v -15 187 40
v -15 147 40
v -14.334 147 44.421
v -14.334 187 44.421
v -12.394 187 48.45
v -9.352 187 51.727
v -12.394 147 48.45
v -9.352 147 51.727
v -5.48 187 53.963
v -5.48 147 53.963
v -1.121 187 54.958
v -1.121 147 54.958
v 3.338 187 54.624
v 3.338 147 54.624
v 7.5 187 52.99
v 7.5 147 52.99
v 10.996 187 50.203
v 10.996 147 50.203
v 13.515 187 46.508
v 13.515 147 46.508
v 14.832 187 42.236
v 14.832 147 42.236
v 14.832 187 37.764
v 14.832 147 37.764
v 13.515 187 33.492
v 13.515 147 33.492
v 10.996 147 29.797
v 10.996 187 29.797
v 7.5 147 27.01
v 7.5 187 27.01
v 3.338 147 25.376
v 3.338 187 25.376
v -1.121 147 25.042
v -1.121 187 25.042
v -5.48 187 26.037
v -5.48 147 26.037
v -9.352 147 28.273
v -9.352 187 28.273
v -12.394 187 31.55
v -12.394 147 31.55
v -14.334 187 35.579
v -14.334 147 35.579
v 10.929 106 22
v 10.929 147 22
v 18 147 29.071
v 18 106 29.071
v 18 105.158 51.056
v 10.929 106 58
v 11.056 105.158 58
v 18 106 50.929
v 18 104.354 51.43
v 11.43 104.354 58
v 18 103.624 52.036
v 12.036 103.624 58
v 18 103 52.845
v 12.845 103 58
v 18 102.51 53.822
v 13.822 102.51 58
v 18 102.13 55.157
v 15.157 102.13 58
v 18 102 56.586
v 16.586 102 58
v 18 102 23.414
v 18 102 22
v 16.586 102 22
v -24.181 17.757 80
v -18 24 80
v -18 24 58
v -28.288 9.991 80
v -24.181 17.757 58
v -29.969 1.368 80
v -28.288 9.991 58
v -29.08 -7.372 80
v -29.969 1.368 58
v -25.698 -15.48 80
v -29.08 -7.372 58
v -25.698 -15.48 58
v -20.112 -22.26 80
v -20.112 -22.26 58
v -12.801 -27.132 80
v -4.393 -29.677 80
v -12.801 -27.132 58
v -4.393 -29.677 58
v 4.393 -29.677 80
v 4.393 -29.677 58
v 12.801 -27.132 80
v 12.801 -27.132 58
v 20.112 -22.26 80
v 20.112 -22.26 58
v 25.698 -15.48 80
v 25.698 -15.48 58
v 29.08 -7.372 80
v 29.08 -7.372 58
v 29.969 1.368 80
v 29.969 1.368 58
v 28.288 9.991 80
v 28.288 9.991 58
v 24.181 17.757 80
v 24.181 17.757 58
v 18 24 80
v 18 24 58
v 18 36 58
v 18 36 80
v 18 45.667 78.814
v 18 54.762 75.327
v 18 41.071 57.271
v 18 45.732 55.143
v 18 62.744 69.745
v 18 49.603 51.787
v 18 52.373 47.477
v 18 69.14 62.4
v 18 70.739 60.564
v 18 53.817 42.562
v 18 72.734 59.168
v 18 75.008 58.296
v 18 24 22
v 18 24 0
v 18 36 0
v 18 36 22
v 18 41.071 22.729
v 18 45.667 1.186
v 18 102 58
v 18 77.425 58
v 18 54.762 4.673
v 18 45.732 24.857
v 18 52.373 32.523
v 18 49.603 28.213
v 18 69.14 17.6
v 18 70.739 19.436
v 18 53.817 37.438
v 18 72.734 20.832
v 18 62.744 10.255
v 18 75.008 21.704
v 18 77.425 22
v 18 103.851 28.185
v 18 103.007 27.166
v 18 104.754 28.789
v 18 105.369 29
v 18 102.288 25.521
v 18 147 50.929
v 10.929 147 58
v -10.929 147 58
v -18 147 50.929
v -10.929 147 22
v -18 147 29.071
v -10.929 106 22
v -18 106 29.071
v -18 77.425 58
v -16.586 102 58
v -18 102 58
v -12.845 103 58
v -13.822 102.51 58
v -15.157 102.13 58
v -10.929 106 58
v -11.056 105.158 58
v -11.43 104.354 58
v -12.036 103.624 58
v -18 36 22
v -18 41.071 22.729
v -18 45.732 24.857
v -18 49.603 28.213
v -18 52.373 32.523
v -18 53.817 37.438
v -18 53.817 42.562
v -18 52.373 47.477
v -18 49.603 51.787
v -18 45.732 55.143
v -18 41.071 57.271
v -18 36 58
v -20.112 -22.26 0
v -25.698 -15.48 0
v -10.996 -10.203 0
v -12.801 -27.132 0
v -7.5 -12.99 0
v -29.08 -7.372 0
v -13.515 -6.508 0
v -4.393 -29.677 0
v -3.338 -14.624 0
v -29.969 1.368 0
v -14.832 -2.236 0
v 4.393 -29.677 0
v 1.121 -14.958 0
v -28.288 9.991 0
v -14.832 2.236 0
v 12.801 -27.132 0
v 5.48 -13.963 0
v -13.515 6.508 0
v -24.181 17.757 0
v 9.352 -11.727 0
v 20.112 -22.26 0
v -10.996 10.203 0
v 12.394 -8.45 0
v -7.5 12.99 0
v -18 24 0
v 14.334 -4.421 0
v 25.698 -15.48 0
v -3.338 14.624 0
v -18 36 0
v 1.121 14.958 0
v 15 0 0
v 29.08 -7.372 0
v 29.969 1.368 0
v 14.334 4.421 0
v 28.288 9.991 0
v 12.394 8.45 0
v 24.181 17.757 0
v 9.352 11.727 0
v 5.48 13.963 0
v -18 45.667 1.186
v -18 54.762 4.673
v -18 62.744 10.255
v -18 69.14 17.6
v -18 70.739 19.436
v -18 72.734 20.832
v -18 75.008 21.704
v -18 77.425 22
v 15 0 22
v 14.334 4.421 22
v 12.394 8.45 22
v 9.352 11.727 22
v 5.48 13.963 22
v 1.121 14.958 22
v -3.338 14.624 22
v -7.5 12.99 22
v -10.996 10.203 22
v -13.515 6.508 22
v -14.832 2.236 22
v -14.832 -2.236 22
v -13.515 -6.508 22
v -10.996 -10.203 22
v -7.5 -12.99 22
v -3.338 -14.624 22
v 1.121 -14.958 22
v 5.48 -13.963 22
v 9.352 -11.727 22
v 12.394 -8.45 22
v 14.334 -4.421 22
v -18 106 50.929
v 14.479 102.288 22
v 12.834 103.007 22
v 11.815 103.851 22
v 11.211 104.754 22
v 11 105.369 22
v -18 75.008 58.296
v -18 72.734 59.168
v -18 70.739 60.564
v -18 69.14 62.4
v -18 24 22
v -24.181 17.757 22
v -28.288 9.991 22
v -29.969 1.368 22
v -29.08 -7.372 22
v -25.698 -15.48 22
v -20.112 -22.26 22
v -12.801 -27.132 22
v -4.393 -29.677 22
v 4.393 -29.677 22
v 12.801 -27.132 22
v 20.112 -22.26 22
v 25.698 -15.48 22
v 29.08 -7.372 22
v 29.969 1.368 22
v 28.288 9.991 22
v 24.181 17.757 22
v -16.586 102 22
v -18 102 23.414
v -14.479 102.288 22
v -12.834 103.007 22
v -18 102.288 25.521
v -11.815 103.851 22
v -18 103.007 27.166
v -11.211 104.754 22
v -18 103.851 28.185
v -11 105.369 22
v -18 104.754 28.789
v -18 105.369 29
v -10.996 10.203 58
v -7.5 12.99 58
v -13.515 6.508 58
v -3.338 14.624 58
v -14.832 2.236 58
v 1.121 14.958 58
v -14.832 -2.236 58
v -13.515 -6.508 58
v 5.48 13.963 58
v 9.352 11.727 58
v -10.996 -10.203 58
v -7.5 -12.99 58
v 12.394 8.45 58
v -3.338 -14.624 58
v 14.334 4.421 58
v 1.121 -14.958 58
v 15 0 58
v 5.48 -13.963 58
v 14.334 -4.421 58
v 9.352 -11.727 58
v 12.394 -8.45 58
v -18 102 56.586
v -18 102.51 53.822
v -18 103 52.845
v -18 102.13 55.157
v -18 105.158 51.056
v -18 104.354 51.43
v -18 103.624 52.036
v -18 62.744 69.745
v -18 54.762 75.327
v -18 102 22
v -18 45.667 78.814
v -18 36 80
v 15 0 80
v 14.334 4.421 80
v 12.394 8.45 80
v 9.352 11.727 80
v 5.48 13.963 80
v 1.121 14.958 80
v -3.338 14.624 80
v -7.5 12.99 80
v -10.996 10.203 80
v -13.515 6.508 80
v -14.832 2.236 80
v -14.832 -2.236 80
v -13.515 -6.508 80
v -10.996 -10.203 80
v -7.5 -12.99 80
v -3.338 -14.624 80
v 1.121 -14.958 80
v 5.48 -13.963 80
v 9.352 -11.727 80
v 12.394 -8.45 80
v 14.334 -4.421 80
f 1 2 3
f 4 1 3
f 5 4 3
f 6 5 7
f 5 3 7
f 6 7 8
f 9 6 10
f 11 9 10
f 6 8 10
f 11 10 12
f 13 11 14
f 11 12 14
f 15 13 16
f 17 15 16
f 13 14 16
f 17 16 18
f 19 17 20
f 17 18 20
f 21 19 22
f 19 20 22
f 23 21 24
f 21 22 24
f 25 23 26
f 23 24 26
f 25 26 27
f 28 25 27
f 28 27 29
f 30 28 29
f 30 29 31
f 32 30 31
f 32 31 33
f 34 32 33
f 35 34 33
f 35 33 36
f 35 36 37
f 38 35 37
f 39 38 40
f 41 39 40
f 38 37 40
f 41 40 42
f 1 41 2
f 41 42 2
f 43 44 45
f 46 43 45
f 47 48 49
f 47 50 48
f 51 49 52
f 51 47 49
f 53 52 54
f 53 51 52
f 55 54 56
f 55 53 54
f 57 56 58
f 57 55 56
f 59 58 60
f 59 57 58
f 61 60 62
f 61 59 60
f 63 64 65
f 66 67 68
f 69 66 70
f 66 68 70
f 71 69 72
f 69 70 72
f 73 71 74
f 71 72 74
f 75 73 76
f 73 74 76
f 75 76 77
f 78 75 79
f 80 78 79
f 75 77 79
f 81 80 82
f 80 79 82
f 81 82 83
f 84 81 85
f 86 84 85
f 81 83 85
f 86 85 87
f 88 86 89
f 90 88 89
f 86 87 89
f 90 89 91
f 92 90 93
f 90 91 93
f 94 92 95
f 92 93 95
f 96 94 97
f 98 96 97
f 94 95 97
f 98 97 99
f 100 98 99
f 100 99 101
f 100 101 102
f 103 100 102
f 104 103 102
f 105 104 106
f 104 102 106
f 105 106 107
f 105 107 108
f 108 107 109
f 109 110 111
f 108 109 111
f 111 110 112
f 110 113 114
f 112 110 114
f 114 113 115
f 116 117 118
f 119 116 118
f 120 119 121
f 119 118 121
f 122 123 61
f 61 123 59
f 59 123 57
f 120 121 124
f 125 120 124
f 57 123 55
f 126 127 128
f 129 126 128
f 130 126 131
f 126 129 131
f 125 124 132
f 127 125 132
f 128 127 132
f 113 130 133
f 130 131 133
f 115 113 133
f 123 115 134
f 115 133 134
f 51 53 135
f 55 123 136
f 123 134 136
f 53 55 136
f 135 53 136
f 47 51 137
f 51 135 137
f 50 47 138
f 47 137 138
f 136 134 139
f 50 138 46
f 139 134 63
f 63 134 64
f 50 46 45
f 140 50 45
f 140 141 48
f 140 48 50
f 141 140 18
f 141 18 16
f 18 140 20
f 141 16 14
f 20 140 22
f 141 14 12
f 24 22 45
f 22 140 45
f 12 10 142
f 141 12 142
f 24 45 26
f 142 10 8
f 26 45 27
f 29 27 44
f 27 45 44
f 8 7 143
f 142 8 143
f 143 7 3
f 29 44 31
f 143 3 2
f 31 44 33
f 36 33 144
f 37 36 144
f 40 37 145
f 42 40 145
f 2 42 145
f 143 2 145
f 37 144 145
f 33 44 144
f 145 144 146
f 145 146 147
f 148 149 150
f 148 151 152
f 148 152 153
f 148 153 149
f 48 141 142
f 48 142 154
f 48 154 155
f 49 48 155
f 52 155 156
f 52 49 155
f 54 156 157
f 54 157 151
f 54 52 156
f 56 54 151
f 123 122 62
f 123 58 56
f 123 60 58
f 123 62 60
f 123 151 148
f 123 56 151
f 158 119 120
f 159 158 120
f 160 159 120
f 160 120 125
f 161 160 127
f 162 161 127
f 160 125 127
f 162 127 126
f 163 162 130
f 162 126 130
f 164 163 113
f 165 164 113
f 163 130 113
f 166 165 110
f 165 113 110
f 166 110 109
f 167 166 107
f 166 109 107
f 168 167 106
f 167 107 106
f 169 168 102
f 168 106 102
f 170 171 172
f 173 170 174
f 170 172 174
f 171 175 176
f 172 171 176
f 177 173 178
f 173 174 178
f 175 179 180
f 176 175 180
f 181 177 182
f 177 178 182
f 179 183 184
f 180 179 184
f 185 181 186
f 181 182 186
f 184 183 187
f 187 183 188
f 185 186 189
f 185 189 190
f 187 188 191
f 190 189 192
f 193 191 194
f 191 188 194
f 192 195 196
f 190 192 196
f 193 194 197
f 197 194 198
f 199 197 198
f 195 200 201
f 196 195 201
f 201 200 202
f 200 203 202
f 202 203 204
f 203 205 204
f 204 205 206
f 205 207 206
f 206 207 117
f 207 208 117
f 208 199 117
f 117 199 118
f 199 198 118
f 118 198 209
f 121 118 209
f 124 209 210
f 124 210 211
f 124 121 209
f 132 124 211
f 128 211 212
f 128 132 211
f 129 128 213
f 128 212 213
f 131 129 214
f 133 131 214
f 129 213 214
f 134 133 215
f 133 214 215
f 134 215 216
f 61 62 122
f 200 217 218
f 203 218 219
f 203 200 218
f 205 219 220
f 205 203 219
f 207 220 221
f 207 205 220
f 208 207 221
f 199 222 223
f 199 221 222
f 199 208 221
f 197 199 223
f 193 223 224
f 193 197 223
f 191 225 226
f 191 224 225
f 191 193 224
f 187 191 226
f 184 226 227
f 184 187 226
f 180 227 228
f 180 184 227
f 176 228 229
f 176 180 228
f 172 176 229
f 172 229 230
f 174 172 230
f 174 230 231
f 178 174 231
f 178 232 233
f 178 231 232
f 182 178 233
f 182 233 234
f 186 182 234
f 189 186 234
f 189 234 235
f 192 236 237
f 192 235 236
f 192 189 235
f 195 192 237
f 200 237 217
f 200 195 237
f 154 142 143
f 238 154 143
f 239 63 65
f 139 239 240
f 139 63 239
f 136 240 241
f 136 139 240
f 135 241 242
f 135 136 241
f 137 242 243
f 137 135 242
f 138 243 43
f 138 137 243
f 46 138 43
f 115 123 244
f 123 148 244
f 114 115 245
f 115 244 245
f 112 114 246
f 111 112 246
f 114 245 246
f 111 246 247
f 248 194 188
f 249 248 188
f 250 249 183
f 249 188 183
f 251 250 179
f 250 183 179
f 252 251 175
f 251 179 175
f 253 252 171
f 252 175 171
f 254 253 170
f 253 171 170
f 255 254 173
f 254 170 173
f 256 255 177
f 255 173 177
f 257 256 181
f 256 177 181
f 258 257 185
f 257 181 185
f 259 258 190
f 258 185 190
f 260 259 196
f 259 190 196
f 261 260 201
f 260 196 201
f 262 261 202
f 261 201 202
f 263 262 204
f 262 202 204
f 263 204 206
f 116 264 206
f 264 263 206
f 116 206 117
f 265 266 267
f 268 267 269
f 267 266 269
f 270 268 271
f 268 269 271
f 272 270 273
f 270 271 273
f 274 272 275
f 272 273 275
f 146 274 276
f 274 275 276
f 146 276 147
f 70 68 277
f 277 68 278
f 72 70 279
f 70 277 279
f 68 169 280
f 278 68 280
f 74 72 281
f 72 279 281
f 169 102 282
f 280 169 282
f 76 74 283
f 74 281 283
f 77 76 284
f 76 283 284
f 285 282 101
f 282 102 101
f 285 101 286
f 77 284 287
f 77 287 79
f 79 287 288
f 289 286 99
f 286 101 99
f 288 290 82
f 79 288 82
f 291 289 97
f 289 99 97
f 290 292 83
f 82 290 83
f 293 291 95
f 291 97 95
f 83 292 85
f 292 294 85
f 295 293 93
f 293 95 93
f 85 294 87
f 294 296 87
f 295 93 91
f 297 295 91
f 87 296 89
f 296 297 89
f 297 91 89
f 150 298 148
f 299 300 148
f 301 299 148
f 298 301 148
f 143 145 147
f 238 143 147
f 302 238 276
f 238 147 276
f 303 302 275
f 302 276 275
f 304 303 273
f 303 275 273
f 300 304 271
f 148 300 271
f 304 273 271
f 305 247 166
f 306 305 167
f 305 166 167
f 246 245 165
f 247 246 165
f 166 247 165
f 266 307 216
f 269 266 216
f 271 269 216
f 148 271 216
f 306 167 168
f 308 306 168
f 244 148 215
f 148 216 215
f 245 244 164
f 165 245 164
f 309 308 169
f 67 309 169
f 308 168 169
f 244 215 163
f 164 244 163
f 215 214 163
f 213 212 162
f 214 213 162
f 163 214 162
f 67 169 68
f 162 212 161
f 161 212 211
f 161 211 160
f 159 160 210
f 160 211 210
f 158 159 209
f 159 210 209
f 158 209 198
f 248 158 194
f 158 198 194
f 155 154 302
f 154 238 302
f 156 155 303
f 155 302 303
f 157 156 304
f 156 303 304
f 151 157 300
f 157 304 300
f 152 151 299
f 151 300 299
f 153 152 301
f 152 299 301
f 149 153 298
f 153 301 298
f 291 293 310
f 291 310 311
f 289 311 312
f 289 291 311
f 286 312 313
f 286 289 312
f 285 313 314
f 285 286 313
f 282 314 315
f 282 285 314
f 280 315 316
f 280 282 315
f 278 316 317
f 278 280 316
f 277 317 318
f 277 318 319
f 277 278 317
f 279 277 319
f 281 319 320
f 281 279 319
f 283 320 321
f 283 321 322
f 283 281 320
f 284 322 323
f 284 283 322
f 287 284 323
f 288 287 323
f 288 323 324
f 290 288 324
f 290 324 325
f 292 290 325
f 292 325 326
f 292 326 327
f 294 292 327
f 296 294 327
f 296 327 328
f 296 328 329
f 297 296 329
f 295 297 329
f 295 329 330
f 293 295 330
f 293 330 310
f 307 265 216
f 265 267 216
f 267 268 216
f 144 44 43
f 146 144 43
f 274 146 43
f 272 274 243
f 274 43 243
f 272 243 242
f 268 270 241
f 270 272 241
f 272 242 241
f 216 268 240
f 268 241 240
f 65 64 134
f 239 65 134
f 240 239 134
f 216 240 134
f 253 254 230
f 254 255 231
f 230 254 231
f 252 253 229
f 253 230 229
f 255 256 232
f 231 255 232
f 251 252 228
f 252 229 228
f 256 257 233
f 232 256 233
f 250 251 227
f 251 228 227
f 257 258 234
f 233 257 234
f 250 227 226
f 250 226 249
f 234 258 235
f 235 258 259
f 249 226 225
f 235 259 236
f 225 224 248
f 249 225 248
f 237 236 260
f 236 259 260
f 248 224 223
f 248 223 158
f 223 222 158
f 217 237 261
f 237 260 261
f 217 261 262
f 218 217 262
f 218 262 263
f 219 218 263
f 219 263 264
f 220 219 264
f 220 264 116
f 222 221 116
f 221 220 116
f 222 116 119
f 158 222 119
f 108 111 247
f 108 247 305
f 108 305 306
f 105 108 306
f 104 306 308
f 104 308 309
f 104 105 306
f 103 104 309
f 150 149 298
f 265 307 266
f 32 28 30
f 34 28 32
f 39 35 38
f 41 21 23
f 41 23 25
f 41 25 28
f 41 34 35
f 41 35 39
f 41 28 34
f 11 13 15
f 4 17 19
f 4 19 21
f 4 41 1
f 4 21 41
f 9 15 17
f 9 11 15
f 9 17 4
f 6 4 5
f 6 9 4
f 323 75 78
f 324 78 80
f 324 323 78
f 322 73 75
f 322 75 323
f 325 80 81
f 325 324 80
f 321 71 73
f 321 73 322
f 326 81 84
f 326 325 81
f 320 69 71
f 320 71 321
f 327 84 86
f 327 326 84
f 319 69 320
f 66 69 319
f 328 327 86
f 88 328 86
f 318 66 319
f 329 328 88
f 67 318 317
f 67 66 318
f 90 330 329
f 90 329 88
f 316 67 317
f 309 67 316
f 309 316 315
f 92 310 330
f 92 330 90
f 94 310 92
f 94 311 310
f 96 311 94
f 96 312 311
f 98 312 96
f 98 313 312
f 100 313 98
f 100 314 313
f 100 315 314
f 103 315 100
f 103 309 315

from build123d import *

# Parameters (mm, degrees)
SKETCH_R        = 15
PAD_DEPTH       = 80
POCKET_DEPTH    = 63.001
FILLET_R        = 10
POCKET001_DEPTH = 45
FILLET001_R     = 4
SKETCH003_R     = 15
PAD001_DEPTH    = 40


with BuildPart() as part:
    # Sketch → Pad (new body)
    with BuildSketch(Plane.XY):
        with BuildLine():
            ThreePointArc((-18, 24), (0, -30), (18, 24))
            Line((18, 24), (18, 147))
            Line((18, 147), (-18, 147))
            Line((-18, 147), (-18, 24))
        make_face()
        Circle(SKETCH_R, mode=Mode.SUBTRACT)
    extrude(amount=PAD_DEPTH)

    # Sketch001 (on Face2 of Pad) → Pocket (cut, through all)
    with BuildSketch(Plane(origin=(33, 0, 40), x_dir=(0, 1, 0), z_dir=(1, 0, 0))):
        with BuildLine():
            Line((-34, -18), (36, -18))
            ThreePointArc((36, -18), (54, 0), (36, 18))
            Line((36, 18), (-34, 18))
            Line((-34, 18), (-34, -18))
        make_face()
        with BuildLine():
            ThreePointArc((36, -40), (56.976177, -34.058773), (71.721142, -18))
            Line((147, -18), (71.721142, -18))
            Line((147, -18), (147, -40))
            Line((147, -40), (36, -40))
        make_face()
        with BuildLine():
            Line((147, 18), (71.721142, 18))
            ThreePointArc((71.721142, 18), (56.976177, 34.058773), (36, 40))
            Line((147, 40), (36, 40))
            Line((147, 18), (147, 40))
        make_face()
    extrude(amount=-POCKET_DEPTH, mode=Mode.SUBTRACT)

    # Fillet
    fillet_edges = [part.edges().sort_by_distance(p)[0] for p in [
        (0, 71.721142, 58),
        (0, 71.721142, 22),
    ]]
    fillet(fillet_edges, radius=FILLET_R)

    # Sketch002 (on Face7 of Fillet) → Pocket001 (cut)
    with BuildSketch(Plane(origin=(0, 147, 0), x_dir=(-1, 0, 0), z_dir=(0, 1, 0))):
        Polygon((-18, 58), (-10.928932, 58), (-18, 50.928932), align=None)
        Polygon((-18, 22), (-10.928932, 22), (-18, 29.071068), align=None)
        Polygon((18, 22), (10.928932, 22), (18, 29.071068), align=None)
        Polygon((18, 58), (10.928932, 58), (18, 50.928932), align=None)
    extrude(amount=-POCKET001_DEPTH, mode=Mode.SUBTRACT)

    # Fillet001
    fillet001_edges = [part.edges().sort_by_distance(p)[0] for p in [
        (-14.464466, 102, 25.535534),
        (14.464466, 102, 25.535534),
        (-14.464466, 102, 54.464466),
        (14.464466, 102, 54.464466),
    ]]
    fillet(fillet001_edges, radius=FILLET001_R)

    # Sketch003 (on Face7 of Fillet001) → Pad001 (join)
    with BuildSketch(Plane(origin=(0, 147, 40), x_dir=(-1, 0, 0), z_dir=(0, 1, 0))):
        Circle(SKETCH003_R)
    extrude(amount=PAD001_DEPTH)


solid = part.part
